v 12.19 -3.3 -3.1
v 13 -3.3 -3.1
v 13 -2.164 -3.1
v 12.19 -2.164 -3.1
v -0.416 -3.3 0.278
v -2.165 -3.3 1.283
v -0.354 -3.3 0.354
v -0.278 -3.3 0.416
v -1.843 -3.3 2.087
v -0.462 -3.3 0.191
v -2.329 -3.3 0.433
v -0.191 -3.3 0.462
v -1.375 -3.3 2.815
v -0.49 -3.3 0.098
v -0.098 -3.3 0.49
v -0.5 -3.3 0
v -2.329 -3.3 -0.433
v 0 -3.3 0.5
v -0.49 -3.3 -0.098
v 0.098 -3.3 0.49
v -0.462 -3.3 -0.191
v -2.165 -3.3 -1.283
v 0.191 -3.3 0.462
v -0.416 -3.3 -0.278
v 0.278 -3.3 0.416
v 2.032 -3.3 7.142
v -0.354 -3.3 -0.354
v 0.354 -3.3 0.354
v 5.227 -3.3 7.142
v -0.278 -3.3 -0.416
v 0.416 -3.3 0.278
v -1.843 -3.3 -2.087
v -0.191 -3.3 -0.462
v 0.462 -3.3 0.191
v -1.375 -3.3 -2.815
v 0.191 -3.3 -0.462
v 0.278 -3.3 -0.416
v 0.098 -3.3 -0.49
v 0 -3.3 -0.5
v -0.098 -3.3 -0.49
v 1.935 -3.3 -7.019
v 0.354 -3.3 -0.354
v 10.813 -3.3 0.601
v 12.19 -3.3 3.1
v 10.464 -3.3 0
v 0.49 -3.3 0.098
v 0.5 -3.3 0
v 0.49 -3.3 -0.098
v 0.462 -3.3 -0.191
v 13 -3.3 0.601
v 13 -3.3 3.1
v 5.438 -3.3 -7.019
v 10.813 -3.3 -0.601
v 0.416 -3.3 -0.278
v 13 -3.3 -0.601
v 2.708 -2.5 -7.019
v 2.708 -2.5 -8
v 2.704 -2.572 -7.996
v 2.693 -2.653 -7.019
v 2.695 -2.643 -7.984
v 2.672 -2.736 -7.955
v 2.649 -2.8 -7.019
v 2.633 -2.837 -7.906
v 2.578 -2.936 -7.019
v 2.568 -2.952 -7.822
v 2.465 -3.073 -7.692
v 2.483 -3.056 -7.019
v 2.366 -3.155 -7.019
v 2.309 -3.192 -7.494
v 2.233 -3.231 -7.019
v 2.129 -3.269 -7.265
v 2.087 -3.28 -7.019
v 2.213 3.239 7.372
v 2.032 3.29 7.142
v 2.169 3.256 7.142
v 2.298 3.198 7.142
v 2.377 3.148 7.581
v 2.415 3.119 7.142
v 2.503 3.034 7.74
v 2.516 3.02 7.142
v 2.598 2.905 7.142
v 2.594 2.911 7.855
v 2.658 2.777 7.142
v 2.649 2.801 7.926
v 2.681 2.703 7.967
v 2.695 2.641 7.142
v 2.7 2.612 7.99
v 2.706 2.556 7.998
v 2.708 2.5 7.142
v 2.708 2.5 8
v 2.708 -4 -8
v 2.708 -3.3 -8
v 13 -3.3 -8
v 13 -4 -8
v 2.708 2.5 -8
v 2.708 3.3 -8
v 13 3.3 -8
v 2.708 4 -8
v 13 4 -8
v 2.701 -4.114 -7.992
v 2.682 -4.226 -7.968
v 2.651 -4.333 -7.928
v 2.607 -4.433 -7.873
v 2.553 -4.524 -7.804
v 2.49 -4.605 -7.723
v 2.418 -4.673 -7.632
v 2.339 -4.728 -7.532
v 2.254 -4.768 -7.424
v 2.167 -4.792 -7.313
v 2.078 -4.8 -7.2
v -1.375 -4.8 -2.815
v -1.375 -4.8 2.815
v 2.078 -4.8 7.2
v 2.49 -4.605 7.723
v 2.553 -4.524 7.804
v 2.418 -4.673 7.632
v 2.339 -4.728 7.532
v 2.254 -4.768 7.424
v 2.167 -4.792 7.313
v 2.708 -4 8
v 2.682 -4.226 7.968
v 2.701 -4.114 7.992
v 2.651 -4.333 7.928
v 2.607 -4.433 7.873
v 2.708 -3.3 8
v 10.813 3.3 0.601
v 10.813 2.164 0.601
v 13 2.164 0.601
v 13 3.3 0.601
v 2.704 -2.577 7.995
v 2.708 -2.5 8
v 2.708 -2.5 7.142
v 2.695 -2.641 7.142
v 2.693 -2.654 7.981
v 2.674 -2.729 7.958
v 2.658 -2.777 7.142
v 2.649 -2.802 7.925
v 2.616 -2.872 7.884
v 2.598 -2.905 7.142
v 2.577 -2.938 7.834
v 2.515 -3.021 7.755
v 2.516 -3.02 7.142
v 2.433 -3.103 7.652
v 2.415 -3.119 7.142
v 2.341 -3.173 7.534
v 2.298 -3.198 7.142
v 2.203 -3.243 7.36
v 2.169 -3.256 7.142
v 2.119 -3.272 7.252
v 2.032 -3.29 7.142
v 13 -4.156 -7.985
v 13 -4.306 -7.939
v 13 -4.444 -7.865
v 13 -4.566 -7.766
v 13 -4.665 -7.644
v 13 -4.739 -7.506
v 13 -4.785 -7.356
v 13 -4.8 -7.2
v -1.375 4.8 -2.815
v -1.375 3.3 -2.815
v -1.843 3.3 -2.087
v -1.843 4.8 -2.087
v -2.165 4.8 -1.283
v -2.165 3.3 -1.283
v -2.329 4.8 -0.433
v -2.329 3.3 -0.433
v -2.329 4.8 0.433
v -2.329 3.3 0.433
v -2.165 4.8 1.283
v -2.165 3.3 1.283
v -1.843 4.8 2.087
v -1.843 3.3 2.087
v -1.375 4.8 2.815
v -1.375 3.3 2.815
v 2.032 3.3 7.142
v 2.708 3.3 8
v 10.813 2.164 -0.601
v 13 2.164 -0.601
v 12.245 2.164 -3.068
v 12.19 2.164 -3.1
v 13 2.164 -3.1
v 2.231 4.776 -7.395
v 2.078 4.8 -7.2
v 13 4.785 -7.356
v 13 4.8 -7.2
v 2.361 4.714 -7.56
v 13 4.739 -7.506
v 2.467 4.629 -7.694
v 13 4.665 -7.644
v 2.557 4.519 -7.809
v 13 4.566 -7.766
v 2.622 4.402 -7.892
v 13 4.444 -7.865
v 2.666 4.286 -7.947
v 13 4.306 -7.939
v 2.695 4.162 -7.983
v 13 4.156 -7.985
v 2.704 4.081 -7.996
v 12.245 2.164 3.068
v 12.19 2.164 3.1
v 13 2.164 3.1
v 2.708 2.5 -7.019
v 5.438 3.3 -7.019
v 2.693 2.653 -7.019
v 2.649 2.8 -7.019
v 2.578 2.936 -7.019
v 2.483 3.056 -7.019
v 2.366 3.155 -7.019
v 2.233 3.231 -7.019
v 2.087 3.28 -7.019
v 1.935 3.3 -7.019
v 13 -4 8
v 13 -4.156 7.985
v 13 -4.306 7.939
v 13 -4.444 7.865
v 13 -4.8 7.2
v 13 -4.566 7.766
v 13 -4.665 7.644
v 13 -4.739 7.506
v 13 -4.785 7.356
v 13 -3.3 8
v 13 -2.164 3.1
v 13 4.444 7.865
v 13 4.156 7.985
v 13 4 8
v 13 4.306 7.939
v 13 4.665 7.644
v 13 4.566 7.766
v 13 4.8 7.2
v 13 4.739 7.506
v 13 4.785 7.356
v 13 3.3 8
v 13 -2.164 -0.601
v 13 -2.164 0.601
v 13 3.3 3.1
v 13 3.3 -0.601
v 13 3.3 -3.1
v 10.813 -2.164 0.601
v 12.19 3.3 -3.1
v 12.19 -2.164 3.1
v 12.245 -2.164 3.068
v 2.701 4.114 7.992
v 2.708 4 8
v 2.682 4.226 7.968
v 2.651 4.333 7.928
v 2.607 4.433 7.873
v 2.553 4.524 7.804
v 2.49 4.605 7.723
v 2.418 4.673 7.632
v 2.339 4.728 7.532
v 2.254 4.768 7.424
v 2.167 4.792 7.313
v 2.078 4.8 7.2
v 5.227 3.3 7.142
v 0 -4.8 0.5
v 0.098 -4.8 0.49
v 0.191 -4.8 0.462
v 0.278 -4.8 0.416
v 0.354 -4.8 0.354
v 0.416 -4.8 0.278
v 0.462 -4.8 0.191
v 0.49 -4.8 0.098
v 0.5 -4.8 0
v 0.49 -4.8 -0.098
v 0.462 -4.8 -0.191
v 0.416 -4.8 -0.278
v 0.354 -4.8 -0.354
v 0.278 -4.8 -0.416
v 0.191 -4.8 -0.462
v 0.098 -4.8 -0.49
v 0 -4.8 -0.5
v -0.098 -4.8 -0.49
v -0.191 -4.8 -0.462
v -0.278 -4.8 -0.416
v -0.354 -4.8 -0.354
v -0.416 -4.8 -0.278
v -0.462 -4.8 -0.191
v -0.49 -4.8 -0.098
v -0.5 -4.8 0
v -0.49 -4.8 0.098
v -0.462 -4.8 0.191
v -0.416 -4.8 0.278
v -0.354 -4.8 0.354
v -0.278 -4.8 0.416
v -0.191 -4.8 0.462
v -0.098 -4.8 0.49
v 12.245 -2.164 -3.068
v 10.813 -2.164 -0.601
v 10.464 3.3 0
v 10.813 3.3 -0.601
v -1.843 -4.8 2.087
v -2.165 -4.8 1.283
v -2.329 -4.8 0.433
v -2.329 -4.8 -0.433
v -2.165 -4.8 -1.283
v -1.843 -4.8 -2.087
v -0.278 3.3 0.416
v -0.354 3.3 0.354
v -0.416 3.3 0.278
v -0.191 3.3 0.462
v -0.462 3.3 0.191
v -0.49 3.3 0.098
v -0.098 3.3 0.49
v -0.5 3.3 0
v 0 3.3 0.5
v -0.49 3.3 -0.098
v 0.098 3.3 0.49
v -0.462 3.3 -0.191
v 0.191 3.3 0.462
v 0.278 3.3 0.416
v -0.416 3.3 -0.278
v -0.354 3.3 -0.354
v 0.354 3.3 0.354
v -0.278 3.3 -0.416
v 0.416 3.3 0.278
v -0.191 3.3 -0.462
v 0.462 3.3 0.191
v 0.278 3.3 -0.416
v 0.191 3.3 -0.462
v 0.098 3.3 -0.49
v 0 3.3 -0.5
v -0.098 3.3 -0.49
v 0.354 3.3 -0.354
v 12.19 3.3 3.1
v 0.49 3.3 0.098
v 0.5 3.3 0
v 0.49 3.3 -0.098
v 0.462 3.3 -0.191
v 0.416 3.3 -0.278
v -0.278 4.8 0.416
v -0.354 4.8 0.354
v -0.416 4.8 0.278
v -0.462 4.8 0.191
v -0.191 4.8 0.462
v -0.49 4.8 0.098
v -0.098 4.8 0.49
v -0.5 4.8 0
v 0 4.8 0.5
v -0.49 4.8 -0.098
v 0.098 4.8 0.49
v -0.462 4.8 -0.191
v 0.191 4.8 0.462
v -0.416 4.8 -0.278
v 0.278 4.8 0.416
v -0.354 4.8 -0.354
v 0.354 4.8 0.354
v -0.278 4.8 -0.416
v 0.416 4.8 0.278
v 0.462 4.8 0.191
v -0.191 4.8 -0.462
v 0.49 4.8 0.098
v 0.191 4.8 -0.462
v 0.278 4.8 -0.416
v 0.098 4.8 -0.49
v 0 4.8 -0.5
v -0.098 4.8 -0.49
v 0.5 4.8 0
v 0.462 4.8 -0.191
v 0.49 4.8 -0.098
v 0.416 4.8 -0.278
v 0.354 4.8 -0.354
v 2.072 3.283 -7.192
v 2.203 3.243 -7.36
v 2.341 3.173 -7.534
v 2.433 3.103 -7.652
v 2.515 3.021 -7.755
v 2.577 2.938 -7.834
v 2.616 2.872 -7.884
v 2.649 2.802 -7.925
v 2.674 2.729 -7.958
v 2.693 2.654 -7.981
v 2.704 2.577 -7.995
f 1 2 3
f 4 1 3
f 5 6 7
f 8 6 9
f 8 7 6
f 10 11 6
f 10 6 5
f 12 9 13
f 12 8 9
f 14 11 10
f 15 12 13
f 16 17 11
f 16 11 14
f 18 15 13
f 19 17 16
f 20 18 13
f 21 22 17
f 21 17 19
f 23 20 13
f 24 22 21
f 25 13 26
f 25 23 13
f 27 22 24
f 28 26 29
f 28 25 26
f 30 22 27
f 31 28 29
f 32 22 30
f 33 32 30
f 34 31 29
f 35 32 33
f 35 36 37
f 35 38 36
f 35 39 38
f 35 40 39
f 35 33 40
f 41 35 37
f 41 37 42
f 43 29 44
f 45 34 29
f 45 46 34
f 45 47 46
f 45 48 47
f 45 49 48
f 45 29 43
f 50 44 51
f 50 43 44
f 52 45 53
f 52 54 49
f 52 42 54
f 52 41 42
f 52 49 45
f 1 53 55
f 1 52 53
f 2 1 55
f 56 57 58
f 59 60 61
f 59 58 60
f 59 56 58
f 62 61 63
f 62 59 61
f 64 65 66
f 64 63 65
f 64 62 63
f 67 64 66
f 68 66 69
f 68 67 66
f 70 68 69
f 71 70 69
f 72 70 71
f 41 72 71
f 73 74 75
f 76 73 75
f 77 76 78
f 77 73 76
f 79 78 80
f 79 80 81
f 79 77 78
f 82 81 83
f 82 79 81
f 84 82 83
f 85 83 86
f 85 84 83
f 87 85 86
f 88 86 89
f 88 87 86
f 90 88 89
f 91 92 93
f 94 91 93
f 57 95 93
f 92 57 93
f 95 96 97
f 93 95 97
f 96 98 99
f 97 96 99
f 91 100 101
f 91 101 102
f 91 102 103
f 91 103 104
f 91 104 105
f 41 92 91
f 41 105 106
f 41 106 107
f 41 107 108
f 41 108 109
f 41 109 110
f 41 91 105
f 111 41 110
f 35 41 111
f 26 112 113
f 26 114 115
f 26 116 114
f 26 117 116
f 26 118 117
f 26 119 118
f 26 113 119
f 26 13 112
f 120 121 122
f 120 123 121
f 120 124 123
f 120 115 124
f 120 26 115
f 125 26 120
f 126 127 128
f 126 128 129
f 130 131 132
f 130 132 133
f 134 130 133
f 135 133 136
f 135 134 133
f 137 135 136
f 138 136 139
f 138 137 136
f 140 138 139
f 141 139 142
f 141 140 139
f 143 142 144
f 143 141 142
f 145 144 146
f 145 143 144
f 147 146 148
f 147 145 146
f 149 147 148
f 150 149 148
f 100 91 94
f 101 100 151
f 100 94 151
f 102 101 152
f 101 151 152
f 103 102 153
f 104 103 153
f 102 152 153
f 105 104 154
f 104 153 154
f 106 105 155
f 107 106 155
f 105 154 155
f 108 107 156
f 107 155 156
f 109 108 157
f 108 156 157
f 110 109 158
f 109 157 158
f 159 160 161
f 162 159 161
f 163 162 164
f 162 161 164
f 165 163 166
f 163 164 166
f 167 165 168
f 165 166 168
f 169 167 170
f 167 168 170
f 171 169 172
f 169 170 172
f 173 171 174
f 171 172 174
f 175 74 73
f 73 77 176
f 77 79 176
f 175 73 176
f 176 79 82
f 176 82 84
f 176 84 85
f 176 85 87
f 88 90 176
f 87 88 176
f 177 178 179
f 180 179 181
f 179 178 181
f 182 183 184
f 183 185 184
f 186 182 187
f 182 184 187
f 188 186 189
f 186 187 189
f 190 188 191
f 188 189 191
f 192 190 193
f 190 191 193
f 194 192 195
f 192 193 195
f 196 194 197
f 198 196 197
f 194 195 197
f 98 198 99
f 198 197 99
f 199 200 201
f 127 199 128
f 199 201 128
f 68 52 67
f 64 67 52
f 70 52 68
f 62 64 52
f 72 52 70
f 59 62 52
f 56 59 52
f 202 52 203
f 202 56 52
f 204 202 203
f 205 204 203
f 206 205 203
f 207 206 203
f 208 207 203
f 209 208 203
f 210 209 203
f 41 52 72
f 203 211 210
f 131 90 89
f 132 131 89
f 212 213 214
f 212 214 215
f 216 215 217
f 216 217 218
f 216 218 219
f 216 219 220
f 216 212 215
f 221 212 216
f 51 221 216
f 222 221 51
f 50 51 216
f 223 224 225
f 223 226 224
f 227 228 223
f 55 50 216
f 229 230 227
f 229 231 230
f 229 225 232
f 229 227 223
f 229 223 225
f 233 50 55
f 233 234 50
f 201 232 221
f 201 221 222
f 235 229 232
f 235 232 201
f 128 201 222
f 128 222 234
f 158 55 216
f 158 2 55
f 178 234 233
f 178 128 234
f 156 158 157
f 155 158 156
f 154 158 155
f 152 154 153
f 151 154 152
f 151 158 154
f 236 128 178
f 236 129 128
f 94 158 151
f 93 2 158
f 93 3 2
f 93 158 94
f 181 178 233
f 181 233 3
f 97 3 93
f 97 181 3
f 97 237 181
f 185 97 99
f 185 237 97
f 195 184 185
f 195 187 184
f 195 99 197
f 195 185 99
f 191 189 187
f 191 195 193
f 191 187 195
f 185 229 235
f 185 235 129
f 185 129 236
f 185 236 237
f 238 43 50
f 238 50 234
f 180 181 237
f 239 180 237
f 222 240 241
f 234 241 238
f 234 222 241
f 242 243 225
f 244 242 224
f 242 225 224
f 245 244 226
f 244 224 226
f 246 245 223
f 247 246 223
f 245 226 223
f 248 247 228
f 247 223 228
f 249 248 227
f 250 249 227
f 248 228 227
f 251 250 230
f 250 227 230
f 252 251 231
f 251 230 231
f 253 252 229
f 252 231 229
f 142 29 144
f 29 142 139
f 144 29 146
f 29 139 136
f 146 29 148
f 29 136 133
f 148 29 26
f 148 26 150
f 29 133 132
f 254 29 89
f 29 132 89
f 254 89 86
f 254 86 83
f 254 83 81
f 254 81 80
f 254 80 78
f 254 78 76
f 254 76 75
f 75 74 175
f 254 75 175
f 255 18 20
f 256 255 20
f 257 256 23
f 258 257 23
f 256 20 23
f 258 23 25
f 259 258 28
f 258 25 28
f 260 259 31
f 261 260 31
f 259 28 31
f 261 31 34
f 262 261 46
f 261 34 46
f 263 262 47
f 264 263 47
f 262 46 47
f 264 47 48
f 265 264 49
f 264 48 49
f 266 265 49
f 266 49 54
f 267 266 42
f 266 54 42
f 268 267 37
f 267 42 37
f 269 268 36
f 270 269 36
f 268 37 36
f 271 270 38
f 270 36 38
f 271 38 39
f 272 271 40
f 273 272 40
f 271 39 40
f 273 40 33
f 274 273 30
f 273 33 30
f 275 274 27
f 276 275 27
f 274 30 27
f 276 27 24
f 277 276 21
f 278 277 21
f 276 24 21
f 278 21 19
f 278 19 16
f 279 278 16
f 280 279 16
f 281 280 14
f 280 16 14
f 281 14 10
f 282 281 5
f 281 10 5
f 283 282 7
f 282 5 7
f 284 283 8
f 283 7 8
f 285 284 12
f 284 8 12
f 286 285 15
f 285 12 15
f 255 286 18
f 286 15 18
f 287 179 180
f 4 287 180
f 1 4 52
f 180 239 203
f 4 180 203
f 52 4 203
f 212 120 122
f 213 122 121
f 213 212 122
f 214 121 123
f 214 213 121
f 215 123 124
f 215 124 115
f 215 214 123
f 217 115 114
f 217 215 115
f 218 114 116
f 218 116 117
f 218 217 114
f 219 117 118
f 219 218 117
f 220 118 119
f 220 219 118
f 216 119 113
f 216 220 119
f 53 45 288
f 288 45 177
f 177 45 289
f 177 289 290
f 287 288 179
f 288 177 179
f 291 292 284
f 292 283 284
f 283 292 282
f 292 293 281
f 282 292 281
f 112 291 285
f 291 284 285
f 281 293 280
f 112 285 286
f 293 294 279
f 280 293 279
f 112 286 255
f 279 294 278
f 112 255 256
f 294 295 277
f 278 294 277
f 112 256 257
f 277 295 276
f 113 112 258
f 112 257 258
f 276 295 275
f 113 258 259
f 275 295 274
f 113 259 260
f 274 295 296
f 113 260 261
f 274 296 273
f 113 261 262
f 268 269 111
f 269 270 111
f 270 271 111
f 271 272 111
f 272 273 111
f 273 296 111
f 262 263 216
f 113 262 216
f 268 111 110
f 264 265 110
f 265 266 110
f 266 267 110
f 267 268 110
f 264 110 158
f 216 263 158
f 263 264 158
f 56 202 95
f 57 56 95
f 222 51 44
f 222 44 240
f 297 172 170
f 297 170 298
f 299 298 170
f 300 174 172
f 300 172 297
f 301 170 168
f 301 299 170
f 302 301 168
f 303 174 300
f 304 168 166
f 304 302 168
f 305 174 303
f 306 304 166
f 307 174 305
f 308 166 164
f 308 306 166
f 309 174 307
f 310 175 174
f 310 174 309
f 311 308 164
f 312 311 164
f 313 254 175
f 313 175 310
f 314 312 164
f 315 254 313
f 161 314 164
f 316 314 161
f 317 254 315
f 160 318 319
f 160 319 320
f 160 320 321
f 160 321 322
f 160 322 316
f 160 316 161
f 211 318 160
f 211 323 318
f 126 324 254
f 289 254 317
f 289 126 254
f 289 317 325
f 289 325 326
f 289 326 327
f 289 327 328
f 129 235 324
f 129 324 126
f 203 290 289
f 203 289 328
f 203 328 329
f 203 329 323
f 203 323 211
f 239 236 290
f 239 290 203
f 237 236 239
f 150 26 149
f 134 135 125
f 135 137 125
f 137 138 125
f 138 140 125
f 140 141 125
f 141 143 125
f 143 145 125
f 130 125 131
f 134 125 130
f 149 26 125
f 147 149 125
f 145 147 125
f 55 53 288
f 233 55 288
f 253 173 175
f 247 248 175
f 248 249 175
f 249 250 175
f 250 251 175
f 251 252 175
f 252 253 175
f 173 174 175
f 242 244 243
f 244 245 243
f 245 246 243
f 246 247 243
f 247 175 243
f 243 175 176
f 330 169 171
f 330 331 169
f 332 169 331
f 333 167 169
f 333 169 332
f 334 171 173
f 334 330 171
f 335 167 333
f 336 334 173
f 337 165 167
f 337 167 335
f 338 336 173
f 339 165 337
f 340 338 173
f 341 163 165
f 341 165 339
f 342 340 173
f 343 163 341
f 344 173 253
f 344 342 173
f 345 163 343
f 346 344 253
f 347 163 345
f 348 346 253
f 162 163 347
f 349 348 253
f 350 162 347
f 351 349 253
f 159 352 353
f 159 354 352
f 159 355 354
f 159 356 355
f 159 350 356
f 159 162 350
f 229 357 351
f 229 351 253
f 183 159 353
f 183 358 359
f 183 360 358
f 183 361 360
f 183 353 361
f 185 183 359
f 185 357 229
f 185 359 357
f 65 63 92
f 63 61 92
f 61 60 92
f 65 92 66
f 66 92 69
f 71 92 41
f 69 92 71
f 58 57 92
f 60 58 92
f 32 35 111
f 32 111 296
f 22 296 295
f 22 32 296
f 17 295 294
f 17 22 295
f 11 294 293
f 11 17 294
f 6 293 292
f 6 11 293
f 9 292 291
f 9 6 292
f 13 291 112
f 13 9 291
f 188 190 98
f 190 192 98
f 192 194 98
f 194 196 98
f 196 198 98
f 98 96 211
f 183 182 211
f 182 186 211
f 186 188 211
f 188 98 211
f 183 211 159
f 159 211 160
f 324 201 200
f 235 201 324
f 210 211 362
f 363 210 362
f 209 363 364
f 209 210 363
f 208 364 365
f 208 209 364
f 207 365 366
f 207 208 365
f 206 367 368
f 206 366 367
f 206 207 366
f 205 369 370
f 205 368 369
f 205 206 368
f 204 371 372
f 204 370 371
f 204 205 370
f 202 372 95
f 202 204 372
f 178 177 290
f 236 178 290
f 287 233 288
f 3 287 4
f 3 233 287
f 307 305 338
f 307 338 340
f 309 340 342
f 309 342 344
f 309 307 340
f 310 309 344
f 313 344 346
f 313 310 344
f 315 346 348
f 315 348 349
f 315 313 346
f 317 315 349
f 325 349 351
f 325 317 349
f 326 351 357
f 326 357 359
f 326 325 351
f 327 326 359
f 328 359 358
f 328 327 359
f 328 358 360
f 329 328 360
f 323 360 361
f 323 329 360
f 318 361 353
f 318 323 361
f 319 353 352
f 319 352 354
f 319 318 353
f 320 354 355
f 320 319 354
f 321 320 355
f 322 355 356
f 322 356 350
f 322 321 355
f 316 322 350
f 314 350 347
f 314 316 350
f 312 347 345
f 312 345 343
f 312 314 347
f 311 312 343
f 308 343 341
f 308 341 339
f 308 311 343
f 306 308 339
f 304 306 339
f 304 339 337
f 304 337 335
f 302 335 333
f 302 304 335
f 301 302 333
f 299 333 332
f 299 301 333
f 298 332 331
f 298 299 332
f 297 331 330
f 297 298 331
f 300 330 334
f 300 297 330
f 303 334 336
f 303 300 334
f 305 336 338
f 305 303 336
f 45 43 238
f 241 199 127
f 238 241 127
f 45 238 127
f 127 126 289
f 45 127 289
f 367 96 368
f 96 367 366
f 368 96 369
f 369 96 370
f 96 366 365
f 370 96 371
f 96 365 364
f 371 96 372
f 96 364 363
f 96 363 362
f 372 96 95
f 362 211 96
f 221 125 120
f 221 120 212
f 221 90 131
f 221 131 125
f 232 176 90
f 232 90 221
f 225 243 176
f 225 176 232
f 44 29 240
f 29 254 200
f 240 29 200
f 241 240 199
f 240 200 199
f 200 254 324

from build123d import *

# Parameters (mm, degrees)
BOSS_EXTRUDE2_DEPTH = 3.3
SKETCH5_R           = 0.5
SKETCH5_W           = 10.292404403
SKETCH5_H           = 16
BOSS_EXTRUDE3_DEPTH = 1.5
SKETCH7_W           = 2.4988973
SKETCH7_H           = 1.136262802
CUT_EXTRUDE1_DEPTH  = 18.9628088
FILLET1_R           = 0.8
FILLET2_R           = 0.8


with BuildPart() as part:
    # Sketch6 → Boss-Extrude2 (new, symmetric)
    with BuildSketch(Plane(origin=(0, 0, 0), x_dir=(1, 0, 0), z_dir=(0, 1, 0))):
        Polygon((13, 8), (13, -8), (4.706393415, -8), (2.707595597, -8), (2.707595597, -7.141772619), (5.22657427, -7.141772619), (12.244932652, -3.06812199), (10.464109218, 0), (12.244932652, 3.06812199), (5.438439019, 7.01880042), (2.707595597, 7.01880042), (2.707595597, 8), (4.706393415, 8), align=None)
    extrude(amount=BOSS_EXTRUDE2_DEPTH, both=True)

    # Sketch5 → Boss-Extrude3 (add)
    # profile 1 of 2: a face of its own
    with BuildSketch(Plane(origin=(0, 3.3, 0), x_dir=(1, 0, 0), z_dir=(0, 1, 0))):
        with BuildLine():
            Line((2.707595597, -8), (2.707595597, 8))
            Line((2.707595597, 8), (-1.374953719, 2.814641346))
            ThreePointArc((-1.374953719, 2.814641346), (-2.35, 0), (-1.374953719, -2.814641346))
            Line((-1.374953719, -2.814641346), (2.707595597, -8))
        make_face()
        with Locations(Location((0, 0, 0), (0, 0, 270))):
            Circle(SKETCH5_R, mode=Mode.SUBTRACT)
    # profile 2 of 2: a face of its own
    with BuildSketch(Plane(origin=(0, 3.3, 0), x_dir=(1, 0, 0), z_dir=(0, 1, 0))):
        with Locations((7.853797799, 0)):
            Rectangle(SKETCH5_W, SKETCH5_H)
    boss_extrude3 = extrude(amount=BOSS_EXTRUDE3_DEPTH)

    # Mirror1: Boss-Extrude3 across plane
    add(boss_extrude3.mirror(Plane.ZX))

    # Sketch7 → Cut-Extrude1 (cut, through all)
    with BuildSketch(Plane(origin=(13, 0, 0), x_dir=(0, 0, -1), z_dir=(1, 0, 0))):
        with Locations((-1.85055135, 2.731868599)):
            Rectangle(SKETCH7_W, SKETCH7_H)
        with Locations((1.85055135, 2.731868599)):
            Rectangle(SKETCH7_W, SKETCH7_H)
        with Locations((-1.85055135, -2.731868599)):
            Rectangle(SKETCH7_W, SKETCH7_H)
        with Locations((1.85055135, -2.731868599)):
            Rectangle(SKETCH7_W, SKETCH7_H)
    extrude(amount=-CUT_EXTRUDE1_DEPTH, mode=Mode.SUBTRACT)

    # Fillet1
    # the kernel refuses this fillet: 0.8 mm, written as the material it adds along each edge
    with BuildSketch(Plane(origin=(2.707595597, -3.3, 8), x_dir=(0, 1, 0), z_dir=(0, 0, -1))) as fillet1_piece_1_section:
        with BuildLine():
            CenterArc((FILLET1_R, -FILLET1_R), FILLET1_R, 90, 90)
            Line((0, -FILLET1_R), (0, 0))
            Line((0, 0), (FILLET1_R, 0))
        make_face()
    fillet1_piece_1 = extrude(amount=0.858227381, mode=Mode.PRIVATE)
    fillet1_piece_1 = split(fillet1_piece_1, bisect_by=Plane(origin=(2.414269103, -3.083958399, 7.627437917), z_dir=(0.785704114090993, 0, -0.6186024936099819)), keep=Keep.TOP, mode=Mode.PRIVATE)
    add(fillet1_piece_1)
    with BuildSketch(Plane(origin=(2.707595597, -3.3, -7.01880042), x_dir=(0, 1, 0), z_dir=(0, 0, -1))) as fillet1_piece_2_section:
        with BuildLine():
            CenterArc((FILLET1_R, -FILLET1_R), FILLET1_R, 90, 90)
            Line((0, -FILLET1_R), (0, 0))
            Line((0, 0), (FILLET1_R, 0))
        make_face()
    fillet1_piece_2 = extrude(amount=0.98119958, mode=Mode.PRIVATE)
    fillet1_piece_2 = split(fillet1_piece_2, bisect_by=Plane(origin=(2.378311496, -3.089381115, -7.581767168), z_dir=(0.7857041140909933, 0, 0.6186024936099818)), keep=Keep.TOP, mode=Mode.PRIVATE)
    add(fillet1_piece_2)
    with BuildSketch(Plane(origin=(2.707595597, 3.3, -7.01880042), x_dir=(0, -1, 0), z_dir=(0, 0, -1))) as fillet1_piece_3_section:
        with BuildLine():
            CenterArc((FILLET1_R, FILLET1_R), FILLET1_R, 180, 90)
            Line((0, FILLET1_R), (0, 0))
            Line((0, 0), (FILLET1_R, 0))
        make_face()
    fillet1_piece_3 = extrude(amount=0.98119958, mode=Mode.PRIVATE)
    fillet1_piece_3 = split(fillet1_piece_3, bisect_by=Plane(origin=(2.378311496, 3.089381115, -7.581767168), z_dir=(0.7857041140909933, 0, 0.6186024936099818)), keep=Keep.TOP, mode=Mode.PRIVATE)
    add(fillet1_piece_3)
    with BuildSketch(Plane(origin=(2.707595597, 3.3, 8), x_dir=(0, -1, 0), z_dir=(0, 0, -1))) as fillet1_piece_4_section:
        with BuildLine():
            CenterArc((FILLET1_R, FILLET1_R), FILLET1_R, 180, 90)
            Line((0, FILLET1_R), (0, 0))
            Line((0, 0), (FILLET1_R, 0))
        make_face()
    fillet1_piece_4 = extrude(amount=0.858227381, mode=Mode.PRIVATE)
    fillet1_piece_4 = split(fillet1_piece_4, bisect_by=Plane(origin=(2.414269103, 3.083958399, 7.627437917), z_dir=(0.785704114090993, 0, -0.6186024936099819)), keep=Keep.TOP, mode=Mode.PRIVATE)
    add(fillet1_piece_4)

    # Fillet2
    fillet2_edges = [part.edges().sort_by_distance(p)[0] for p in [
        (7.853797799, 4.8, 8),
        (7.853797799, 4.8, -8),
        (7.853797799, -4.8, -8),
        (7.853797799, -4.8, 8),
    ]]
    fillet(fillet2_edges, radius=FILLET2_R)


solid = part.part
